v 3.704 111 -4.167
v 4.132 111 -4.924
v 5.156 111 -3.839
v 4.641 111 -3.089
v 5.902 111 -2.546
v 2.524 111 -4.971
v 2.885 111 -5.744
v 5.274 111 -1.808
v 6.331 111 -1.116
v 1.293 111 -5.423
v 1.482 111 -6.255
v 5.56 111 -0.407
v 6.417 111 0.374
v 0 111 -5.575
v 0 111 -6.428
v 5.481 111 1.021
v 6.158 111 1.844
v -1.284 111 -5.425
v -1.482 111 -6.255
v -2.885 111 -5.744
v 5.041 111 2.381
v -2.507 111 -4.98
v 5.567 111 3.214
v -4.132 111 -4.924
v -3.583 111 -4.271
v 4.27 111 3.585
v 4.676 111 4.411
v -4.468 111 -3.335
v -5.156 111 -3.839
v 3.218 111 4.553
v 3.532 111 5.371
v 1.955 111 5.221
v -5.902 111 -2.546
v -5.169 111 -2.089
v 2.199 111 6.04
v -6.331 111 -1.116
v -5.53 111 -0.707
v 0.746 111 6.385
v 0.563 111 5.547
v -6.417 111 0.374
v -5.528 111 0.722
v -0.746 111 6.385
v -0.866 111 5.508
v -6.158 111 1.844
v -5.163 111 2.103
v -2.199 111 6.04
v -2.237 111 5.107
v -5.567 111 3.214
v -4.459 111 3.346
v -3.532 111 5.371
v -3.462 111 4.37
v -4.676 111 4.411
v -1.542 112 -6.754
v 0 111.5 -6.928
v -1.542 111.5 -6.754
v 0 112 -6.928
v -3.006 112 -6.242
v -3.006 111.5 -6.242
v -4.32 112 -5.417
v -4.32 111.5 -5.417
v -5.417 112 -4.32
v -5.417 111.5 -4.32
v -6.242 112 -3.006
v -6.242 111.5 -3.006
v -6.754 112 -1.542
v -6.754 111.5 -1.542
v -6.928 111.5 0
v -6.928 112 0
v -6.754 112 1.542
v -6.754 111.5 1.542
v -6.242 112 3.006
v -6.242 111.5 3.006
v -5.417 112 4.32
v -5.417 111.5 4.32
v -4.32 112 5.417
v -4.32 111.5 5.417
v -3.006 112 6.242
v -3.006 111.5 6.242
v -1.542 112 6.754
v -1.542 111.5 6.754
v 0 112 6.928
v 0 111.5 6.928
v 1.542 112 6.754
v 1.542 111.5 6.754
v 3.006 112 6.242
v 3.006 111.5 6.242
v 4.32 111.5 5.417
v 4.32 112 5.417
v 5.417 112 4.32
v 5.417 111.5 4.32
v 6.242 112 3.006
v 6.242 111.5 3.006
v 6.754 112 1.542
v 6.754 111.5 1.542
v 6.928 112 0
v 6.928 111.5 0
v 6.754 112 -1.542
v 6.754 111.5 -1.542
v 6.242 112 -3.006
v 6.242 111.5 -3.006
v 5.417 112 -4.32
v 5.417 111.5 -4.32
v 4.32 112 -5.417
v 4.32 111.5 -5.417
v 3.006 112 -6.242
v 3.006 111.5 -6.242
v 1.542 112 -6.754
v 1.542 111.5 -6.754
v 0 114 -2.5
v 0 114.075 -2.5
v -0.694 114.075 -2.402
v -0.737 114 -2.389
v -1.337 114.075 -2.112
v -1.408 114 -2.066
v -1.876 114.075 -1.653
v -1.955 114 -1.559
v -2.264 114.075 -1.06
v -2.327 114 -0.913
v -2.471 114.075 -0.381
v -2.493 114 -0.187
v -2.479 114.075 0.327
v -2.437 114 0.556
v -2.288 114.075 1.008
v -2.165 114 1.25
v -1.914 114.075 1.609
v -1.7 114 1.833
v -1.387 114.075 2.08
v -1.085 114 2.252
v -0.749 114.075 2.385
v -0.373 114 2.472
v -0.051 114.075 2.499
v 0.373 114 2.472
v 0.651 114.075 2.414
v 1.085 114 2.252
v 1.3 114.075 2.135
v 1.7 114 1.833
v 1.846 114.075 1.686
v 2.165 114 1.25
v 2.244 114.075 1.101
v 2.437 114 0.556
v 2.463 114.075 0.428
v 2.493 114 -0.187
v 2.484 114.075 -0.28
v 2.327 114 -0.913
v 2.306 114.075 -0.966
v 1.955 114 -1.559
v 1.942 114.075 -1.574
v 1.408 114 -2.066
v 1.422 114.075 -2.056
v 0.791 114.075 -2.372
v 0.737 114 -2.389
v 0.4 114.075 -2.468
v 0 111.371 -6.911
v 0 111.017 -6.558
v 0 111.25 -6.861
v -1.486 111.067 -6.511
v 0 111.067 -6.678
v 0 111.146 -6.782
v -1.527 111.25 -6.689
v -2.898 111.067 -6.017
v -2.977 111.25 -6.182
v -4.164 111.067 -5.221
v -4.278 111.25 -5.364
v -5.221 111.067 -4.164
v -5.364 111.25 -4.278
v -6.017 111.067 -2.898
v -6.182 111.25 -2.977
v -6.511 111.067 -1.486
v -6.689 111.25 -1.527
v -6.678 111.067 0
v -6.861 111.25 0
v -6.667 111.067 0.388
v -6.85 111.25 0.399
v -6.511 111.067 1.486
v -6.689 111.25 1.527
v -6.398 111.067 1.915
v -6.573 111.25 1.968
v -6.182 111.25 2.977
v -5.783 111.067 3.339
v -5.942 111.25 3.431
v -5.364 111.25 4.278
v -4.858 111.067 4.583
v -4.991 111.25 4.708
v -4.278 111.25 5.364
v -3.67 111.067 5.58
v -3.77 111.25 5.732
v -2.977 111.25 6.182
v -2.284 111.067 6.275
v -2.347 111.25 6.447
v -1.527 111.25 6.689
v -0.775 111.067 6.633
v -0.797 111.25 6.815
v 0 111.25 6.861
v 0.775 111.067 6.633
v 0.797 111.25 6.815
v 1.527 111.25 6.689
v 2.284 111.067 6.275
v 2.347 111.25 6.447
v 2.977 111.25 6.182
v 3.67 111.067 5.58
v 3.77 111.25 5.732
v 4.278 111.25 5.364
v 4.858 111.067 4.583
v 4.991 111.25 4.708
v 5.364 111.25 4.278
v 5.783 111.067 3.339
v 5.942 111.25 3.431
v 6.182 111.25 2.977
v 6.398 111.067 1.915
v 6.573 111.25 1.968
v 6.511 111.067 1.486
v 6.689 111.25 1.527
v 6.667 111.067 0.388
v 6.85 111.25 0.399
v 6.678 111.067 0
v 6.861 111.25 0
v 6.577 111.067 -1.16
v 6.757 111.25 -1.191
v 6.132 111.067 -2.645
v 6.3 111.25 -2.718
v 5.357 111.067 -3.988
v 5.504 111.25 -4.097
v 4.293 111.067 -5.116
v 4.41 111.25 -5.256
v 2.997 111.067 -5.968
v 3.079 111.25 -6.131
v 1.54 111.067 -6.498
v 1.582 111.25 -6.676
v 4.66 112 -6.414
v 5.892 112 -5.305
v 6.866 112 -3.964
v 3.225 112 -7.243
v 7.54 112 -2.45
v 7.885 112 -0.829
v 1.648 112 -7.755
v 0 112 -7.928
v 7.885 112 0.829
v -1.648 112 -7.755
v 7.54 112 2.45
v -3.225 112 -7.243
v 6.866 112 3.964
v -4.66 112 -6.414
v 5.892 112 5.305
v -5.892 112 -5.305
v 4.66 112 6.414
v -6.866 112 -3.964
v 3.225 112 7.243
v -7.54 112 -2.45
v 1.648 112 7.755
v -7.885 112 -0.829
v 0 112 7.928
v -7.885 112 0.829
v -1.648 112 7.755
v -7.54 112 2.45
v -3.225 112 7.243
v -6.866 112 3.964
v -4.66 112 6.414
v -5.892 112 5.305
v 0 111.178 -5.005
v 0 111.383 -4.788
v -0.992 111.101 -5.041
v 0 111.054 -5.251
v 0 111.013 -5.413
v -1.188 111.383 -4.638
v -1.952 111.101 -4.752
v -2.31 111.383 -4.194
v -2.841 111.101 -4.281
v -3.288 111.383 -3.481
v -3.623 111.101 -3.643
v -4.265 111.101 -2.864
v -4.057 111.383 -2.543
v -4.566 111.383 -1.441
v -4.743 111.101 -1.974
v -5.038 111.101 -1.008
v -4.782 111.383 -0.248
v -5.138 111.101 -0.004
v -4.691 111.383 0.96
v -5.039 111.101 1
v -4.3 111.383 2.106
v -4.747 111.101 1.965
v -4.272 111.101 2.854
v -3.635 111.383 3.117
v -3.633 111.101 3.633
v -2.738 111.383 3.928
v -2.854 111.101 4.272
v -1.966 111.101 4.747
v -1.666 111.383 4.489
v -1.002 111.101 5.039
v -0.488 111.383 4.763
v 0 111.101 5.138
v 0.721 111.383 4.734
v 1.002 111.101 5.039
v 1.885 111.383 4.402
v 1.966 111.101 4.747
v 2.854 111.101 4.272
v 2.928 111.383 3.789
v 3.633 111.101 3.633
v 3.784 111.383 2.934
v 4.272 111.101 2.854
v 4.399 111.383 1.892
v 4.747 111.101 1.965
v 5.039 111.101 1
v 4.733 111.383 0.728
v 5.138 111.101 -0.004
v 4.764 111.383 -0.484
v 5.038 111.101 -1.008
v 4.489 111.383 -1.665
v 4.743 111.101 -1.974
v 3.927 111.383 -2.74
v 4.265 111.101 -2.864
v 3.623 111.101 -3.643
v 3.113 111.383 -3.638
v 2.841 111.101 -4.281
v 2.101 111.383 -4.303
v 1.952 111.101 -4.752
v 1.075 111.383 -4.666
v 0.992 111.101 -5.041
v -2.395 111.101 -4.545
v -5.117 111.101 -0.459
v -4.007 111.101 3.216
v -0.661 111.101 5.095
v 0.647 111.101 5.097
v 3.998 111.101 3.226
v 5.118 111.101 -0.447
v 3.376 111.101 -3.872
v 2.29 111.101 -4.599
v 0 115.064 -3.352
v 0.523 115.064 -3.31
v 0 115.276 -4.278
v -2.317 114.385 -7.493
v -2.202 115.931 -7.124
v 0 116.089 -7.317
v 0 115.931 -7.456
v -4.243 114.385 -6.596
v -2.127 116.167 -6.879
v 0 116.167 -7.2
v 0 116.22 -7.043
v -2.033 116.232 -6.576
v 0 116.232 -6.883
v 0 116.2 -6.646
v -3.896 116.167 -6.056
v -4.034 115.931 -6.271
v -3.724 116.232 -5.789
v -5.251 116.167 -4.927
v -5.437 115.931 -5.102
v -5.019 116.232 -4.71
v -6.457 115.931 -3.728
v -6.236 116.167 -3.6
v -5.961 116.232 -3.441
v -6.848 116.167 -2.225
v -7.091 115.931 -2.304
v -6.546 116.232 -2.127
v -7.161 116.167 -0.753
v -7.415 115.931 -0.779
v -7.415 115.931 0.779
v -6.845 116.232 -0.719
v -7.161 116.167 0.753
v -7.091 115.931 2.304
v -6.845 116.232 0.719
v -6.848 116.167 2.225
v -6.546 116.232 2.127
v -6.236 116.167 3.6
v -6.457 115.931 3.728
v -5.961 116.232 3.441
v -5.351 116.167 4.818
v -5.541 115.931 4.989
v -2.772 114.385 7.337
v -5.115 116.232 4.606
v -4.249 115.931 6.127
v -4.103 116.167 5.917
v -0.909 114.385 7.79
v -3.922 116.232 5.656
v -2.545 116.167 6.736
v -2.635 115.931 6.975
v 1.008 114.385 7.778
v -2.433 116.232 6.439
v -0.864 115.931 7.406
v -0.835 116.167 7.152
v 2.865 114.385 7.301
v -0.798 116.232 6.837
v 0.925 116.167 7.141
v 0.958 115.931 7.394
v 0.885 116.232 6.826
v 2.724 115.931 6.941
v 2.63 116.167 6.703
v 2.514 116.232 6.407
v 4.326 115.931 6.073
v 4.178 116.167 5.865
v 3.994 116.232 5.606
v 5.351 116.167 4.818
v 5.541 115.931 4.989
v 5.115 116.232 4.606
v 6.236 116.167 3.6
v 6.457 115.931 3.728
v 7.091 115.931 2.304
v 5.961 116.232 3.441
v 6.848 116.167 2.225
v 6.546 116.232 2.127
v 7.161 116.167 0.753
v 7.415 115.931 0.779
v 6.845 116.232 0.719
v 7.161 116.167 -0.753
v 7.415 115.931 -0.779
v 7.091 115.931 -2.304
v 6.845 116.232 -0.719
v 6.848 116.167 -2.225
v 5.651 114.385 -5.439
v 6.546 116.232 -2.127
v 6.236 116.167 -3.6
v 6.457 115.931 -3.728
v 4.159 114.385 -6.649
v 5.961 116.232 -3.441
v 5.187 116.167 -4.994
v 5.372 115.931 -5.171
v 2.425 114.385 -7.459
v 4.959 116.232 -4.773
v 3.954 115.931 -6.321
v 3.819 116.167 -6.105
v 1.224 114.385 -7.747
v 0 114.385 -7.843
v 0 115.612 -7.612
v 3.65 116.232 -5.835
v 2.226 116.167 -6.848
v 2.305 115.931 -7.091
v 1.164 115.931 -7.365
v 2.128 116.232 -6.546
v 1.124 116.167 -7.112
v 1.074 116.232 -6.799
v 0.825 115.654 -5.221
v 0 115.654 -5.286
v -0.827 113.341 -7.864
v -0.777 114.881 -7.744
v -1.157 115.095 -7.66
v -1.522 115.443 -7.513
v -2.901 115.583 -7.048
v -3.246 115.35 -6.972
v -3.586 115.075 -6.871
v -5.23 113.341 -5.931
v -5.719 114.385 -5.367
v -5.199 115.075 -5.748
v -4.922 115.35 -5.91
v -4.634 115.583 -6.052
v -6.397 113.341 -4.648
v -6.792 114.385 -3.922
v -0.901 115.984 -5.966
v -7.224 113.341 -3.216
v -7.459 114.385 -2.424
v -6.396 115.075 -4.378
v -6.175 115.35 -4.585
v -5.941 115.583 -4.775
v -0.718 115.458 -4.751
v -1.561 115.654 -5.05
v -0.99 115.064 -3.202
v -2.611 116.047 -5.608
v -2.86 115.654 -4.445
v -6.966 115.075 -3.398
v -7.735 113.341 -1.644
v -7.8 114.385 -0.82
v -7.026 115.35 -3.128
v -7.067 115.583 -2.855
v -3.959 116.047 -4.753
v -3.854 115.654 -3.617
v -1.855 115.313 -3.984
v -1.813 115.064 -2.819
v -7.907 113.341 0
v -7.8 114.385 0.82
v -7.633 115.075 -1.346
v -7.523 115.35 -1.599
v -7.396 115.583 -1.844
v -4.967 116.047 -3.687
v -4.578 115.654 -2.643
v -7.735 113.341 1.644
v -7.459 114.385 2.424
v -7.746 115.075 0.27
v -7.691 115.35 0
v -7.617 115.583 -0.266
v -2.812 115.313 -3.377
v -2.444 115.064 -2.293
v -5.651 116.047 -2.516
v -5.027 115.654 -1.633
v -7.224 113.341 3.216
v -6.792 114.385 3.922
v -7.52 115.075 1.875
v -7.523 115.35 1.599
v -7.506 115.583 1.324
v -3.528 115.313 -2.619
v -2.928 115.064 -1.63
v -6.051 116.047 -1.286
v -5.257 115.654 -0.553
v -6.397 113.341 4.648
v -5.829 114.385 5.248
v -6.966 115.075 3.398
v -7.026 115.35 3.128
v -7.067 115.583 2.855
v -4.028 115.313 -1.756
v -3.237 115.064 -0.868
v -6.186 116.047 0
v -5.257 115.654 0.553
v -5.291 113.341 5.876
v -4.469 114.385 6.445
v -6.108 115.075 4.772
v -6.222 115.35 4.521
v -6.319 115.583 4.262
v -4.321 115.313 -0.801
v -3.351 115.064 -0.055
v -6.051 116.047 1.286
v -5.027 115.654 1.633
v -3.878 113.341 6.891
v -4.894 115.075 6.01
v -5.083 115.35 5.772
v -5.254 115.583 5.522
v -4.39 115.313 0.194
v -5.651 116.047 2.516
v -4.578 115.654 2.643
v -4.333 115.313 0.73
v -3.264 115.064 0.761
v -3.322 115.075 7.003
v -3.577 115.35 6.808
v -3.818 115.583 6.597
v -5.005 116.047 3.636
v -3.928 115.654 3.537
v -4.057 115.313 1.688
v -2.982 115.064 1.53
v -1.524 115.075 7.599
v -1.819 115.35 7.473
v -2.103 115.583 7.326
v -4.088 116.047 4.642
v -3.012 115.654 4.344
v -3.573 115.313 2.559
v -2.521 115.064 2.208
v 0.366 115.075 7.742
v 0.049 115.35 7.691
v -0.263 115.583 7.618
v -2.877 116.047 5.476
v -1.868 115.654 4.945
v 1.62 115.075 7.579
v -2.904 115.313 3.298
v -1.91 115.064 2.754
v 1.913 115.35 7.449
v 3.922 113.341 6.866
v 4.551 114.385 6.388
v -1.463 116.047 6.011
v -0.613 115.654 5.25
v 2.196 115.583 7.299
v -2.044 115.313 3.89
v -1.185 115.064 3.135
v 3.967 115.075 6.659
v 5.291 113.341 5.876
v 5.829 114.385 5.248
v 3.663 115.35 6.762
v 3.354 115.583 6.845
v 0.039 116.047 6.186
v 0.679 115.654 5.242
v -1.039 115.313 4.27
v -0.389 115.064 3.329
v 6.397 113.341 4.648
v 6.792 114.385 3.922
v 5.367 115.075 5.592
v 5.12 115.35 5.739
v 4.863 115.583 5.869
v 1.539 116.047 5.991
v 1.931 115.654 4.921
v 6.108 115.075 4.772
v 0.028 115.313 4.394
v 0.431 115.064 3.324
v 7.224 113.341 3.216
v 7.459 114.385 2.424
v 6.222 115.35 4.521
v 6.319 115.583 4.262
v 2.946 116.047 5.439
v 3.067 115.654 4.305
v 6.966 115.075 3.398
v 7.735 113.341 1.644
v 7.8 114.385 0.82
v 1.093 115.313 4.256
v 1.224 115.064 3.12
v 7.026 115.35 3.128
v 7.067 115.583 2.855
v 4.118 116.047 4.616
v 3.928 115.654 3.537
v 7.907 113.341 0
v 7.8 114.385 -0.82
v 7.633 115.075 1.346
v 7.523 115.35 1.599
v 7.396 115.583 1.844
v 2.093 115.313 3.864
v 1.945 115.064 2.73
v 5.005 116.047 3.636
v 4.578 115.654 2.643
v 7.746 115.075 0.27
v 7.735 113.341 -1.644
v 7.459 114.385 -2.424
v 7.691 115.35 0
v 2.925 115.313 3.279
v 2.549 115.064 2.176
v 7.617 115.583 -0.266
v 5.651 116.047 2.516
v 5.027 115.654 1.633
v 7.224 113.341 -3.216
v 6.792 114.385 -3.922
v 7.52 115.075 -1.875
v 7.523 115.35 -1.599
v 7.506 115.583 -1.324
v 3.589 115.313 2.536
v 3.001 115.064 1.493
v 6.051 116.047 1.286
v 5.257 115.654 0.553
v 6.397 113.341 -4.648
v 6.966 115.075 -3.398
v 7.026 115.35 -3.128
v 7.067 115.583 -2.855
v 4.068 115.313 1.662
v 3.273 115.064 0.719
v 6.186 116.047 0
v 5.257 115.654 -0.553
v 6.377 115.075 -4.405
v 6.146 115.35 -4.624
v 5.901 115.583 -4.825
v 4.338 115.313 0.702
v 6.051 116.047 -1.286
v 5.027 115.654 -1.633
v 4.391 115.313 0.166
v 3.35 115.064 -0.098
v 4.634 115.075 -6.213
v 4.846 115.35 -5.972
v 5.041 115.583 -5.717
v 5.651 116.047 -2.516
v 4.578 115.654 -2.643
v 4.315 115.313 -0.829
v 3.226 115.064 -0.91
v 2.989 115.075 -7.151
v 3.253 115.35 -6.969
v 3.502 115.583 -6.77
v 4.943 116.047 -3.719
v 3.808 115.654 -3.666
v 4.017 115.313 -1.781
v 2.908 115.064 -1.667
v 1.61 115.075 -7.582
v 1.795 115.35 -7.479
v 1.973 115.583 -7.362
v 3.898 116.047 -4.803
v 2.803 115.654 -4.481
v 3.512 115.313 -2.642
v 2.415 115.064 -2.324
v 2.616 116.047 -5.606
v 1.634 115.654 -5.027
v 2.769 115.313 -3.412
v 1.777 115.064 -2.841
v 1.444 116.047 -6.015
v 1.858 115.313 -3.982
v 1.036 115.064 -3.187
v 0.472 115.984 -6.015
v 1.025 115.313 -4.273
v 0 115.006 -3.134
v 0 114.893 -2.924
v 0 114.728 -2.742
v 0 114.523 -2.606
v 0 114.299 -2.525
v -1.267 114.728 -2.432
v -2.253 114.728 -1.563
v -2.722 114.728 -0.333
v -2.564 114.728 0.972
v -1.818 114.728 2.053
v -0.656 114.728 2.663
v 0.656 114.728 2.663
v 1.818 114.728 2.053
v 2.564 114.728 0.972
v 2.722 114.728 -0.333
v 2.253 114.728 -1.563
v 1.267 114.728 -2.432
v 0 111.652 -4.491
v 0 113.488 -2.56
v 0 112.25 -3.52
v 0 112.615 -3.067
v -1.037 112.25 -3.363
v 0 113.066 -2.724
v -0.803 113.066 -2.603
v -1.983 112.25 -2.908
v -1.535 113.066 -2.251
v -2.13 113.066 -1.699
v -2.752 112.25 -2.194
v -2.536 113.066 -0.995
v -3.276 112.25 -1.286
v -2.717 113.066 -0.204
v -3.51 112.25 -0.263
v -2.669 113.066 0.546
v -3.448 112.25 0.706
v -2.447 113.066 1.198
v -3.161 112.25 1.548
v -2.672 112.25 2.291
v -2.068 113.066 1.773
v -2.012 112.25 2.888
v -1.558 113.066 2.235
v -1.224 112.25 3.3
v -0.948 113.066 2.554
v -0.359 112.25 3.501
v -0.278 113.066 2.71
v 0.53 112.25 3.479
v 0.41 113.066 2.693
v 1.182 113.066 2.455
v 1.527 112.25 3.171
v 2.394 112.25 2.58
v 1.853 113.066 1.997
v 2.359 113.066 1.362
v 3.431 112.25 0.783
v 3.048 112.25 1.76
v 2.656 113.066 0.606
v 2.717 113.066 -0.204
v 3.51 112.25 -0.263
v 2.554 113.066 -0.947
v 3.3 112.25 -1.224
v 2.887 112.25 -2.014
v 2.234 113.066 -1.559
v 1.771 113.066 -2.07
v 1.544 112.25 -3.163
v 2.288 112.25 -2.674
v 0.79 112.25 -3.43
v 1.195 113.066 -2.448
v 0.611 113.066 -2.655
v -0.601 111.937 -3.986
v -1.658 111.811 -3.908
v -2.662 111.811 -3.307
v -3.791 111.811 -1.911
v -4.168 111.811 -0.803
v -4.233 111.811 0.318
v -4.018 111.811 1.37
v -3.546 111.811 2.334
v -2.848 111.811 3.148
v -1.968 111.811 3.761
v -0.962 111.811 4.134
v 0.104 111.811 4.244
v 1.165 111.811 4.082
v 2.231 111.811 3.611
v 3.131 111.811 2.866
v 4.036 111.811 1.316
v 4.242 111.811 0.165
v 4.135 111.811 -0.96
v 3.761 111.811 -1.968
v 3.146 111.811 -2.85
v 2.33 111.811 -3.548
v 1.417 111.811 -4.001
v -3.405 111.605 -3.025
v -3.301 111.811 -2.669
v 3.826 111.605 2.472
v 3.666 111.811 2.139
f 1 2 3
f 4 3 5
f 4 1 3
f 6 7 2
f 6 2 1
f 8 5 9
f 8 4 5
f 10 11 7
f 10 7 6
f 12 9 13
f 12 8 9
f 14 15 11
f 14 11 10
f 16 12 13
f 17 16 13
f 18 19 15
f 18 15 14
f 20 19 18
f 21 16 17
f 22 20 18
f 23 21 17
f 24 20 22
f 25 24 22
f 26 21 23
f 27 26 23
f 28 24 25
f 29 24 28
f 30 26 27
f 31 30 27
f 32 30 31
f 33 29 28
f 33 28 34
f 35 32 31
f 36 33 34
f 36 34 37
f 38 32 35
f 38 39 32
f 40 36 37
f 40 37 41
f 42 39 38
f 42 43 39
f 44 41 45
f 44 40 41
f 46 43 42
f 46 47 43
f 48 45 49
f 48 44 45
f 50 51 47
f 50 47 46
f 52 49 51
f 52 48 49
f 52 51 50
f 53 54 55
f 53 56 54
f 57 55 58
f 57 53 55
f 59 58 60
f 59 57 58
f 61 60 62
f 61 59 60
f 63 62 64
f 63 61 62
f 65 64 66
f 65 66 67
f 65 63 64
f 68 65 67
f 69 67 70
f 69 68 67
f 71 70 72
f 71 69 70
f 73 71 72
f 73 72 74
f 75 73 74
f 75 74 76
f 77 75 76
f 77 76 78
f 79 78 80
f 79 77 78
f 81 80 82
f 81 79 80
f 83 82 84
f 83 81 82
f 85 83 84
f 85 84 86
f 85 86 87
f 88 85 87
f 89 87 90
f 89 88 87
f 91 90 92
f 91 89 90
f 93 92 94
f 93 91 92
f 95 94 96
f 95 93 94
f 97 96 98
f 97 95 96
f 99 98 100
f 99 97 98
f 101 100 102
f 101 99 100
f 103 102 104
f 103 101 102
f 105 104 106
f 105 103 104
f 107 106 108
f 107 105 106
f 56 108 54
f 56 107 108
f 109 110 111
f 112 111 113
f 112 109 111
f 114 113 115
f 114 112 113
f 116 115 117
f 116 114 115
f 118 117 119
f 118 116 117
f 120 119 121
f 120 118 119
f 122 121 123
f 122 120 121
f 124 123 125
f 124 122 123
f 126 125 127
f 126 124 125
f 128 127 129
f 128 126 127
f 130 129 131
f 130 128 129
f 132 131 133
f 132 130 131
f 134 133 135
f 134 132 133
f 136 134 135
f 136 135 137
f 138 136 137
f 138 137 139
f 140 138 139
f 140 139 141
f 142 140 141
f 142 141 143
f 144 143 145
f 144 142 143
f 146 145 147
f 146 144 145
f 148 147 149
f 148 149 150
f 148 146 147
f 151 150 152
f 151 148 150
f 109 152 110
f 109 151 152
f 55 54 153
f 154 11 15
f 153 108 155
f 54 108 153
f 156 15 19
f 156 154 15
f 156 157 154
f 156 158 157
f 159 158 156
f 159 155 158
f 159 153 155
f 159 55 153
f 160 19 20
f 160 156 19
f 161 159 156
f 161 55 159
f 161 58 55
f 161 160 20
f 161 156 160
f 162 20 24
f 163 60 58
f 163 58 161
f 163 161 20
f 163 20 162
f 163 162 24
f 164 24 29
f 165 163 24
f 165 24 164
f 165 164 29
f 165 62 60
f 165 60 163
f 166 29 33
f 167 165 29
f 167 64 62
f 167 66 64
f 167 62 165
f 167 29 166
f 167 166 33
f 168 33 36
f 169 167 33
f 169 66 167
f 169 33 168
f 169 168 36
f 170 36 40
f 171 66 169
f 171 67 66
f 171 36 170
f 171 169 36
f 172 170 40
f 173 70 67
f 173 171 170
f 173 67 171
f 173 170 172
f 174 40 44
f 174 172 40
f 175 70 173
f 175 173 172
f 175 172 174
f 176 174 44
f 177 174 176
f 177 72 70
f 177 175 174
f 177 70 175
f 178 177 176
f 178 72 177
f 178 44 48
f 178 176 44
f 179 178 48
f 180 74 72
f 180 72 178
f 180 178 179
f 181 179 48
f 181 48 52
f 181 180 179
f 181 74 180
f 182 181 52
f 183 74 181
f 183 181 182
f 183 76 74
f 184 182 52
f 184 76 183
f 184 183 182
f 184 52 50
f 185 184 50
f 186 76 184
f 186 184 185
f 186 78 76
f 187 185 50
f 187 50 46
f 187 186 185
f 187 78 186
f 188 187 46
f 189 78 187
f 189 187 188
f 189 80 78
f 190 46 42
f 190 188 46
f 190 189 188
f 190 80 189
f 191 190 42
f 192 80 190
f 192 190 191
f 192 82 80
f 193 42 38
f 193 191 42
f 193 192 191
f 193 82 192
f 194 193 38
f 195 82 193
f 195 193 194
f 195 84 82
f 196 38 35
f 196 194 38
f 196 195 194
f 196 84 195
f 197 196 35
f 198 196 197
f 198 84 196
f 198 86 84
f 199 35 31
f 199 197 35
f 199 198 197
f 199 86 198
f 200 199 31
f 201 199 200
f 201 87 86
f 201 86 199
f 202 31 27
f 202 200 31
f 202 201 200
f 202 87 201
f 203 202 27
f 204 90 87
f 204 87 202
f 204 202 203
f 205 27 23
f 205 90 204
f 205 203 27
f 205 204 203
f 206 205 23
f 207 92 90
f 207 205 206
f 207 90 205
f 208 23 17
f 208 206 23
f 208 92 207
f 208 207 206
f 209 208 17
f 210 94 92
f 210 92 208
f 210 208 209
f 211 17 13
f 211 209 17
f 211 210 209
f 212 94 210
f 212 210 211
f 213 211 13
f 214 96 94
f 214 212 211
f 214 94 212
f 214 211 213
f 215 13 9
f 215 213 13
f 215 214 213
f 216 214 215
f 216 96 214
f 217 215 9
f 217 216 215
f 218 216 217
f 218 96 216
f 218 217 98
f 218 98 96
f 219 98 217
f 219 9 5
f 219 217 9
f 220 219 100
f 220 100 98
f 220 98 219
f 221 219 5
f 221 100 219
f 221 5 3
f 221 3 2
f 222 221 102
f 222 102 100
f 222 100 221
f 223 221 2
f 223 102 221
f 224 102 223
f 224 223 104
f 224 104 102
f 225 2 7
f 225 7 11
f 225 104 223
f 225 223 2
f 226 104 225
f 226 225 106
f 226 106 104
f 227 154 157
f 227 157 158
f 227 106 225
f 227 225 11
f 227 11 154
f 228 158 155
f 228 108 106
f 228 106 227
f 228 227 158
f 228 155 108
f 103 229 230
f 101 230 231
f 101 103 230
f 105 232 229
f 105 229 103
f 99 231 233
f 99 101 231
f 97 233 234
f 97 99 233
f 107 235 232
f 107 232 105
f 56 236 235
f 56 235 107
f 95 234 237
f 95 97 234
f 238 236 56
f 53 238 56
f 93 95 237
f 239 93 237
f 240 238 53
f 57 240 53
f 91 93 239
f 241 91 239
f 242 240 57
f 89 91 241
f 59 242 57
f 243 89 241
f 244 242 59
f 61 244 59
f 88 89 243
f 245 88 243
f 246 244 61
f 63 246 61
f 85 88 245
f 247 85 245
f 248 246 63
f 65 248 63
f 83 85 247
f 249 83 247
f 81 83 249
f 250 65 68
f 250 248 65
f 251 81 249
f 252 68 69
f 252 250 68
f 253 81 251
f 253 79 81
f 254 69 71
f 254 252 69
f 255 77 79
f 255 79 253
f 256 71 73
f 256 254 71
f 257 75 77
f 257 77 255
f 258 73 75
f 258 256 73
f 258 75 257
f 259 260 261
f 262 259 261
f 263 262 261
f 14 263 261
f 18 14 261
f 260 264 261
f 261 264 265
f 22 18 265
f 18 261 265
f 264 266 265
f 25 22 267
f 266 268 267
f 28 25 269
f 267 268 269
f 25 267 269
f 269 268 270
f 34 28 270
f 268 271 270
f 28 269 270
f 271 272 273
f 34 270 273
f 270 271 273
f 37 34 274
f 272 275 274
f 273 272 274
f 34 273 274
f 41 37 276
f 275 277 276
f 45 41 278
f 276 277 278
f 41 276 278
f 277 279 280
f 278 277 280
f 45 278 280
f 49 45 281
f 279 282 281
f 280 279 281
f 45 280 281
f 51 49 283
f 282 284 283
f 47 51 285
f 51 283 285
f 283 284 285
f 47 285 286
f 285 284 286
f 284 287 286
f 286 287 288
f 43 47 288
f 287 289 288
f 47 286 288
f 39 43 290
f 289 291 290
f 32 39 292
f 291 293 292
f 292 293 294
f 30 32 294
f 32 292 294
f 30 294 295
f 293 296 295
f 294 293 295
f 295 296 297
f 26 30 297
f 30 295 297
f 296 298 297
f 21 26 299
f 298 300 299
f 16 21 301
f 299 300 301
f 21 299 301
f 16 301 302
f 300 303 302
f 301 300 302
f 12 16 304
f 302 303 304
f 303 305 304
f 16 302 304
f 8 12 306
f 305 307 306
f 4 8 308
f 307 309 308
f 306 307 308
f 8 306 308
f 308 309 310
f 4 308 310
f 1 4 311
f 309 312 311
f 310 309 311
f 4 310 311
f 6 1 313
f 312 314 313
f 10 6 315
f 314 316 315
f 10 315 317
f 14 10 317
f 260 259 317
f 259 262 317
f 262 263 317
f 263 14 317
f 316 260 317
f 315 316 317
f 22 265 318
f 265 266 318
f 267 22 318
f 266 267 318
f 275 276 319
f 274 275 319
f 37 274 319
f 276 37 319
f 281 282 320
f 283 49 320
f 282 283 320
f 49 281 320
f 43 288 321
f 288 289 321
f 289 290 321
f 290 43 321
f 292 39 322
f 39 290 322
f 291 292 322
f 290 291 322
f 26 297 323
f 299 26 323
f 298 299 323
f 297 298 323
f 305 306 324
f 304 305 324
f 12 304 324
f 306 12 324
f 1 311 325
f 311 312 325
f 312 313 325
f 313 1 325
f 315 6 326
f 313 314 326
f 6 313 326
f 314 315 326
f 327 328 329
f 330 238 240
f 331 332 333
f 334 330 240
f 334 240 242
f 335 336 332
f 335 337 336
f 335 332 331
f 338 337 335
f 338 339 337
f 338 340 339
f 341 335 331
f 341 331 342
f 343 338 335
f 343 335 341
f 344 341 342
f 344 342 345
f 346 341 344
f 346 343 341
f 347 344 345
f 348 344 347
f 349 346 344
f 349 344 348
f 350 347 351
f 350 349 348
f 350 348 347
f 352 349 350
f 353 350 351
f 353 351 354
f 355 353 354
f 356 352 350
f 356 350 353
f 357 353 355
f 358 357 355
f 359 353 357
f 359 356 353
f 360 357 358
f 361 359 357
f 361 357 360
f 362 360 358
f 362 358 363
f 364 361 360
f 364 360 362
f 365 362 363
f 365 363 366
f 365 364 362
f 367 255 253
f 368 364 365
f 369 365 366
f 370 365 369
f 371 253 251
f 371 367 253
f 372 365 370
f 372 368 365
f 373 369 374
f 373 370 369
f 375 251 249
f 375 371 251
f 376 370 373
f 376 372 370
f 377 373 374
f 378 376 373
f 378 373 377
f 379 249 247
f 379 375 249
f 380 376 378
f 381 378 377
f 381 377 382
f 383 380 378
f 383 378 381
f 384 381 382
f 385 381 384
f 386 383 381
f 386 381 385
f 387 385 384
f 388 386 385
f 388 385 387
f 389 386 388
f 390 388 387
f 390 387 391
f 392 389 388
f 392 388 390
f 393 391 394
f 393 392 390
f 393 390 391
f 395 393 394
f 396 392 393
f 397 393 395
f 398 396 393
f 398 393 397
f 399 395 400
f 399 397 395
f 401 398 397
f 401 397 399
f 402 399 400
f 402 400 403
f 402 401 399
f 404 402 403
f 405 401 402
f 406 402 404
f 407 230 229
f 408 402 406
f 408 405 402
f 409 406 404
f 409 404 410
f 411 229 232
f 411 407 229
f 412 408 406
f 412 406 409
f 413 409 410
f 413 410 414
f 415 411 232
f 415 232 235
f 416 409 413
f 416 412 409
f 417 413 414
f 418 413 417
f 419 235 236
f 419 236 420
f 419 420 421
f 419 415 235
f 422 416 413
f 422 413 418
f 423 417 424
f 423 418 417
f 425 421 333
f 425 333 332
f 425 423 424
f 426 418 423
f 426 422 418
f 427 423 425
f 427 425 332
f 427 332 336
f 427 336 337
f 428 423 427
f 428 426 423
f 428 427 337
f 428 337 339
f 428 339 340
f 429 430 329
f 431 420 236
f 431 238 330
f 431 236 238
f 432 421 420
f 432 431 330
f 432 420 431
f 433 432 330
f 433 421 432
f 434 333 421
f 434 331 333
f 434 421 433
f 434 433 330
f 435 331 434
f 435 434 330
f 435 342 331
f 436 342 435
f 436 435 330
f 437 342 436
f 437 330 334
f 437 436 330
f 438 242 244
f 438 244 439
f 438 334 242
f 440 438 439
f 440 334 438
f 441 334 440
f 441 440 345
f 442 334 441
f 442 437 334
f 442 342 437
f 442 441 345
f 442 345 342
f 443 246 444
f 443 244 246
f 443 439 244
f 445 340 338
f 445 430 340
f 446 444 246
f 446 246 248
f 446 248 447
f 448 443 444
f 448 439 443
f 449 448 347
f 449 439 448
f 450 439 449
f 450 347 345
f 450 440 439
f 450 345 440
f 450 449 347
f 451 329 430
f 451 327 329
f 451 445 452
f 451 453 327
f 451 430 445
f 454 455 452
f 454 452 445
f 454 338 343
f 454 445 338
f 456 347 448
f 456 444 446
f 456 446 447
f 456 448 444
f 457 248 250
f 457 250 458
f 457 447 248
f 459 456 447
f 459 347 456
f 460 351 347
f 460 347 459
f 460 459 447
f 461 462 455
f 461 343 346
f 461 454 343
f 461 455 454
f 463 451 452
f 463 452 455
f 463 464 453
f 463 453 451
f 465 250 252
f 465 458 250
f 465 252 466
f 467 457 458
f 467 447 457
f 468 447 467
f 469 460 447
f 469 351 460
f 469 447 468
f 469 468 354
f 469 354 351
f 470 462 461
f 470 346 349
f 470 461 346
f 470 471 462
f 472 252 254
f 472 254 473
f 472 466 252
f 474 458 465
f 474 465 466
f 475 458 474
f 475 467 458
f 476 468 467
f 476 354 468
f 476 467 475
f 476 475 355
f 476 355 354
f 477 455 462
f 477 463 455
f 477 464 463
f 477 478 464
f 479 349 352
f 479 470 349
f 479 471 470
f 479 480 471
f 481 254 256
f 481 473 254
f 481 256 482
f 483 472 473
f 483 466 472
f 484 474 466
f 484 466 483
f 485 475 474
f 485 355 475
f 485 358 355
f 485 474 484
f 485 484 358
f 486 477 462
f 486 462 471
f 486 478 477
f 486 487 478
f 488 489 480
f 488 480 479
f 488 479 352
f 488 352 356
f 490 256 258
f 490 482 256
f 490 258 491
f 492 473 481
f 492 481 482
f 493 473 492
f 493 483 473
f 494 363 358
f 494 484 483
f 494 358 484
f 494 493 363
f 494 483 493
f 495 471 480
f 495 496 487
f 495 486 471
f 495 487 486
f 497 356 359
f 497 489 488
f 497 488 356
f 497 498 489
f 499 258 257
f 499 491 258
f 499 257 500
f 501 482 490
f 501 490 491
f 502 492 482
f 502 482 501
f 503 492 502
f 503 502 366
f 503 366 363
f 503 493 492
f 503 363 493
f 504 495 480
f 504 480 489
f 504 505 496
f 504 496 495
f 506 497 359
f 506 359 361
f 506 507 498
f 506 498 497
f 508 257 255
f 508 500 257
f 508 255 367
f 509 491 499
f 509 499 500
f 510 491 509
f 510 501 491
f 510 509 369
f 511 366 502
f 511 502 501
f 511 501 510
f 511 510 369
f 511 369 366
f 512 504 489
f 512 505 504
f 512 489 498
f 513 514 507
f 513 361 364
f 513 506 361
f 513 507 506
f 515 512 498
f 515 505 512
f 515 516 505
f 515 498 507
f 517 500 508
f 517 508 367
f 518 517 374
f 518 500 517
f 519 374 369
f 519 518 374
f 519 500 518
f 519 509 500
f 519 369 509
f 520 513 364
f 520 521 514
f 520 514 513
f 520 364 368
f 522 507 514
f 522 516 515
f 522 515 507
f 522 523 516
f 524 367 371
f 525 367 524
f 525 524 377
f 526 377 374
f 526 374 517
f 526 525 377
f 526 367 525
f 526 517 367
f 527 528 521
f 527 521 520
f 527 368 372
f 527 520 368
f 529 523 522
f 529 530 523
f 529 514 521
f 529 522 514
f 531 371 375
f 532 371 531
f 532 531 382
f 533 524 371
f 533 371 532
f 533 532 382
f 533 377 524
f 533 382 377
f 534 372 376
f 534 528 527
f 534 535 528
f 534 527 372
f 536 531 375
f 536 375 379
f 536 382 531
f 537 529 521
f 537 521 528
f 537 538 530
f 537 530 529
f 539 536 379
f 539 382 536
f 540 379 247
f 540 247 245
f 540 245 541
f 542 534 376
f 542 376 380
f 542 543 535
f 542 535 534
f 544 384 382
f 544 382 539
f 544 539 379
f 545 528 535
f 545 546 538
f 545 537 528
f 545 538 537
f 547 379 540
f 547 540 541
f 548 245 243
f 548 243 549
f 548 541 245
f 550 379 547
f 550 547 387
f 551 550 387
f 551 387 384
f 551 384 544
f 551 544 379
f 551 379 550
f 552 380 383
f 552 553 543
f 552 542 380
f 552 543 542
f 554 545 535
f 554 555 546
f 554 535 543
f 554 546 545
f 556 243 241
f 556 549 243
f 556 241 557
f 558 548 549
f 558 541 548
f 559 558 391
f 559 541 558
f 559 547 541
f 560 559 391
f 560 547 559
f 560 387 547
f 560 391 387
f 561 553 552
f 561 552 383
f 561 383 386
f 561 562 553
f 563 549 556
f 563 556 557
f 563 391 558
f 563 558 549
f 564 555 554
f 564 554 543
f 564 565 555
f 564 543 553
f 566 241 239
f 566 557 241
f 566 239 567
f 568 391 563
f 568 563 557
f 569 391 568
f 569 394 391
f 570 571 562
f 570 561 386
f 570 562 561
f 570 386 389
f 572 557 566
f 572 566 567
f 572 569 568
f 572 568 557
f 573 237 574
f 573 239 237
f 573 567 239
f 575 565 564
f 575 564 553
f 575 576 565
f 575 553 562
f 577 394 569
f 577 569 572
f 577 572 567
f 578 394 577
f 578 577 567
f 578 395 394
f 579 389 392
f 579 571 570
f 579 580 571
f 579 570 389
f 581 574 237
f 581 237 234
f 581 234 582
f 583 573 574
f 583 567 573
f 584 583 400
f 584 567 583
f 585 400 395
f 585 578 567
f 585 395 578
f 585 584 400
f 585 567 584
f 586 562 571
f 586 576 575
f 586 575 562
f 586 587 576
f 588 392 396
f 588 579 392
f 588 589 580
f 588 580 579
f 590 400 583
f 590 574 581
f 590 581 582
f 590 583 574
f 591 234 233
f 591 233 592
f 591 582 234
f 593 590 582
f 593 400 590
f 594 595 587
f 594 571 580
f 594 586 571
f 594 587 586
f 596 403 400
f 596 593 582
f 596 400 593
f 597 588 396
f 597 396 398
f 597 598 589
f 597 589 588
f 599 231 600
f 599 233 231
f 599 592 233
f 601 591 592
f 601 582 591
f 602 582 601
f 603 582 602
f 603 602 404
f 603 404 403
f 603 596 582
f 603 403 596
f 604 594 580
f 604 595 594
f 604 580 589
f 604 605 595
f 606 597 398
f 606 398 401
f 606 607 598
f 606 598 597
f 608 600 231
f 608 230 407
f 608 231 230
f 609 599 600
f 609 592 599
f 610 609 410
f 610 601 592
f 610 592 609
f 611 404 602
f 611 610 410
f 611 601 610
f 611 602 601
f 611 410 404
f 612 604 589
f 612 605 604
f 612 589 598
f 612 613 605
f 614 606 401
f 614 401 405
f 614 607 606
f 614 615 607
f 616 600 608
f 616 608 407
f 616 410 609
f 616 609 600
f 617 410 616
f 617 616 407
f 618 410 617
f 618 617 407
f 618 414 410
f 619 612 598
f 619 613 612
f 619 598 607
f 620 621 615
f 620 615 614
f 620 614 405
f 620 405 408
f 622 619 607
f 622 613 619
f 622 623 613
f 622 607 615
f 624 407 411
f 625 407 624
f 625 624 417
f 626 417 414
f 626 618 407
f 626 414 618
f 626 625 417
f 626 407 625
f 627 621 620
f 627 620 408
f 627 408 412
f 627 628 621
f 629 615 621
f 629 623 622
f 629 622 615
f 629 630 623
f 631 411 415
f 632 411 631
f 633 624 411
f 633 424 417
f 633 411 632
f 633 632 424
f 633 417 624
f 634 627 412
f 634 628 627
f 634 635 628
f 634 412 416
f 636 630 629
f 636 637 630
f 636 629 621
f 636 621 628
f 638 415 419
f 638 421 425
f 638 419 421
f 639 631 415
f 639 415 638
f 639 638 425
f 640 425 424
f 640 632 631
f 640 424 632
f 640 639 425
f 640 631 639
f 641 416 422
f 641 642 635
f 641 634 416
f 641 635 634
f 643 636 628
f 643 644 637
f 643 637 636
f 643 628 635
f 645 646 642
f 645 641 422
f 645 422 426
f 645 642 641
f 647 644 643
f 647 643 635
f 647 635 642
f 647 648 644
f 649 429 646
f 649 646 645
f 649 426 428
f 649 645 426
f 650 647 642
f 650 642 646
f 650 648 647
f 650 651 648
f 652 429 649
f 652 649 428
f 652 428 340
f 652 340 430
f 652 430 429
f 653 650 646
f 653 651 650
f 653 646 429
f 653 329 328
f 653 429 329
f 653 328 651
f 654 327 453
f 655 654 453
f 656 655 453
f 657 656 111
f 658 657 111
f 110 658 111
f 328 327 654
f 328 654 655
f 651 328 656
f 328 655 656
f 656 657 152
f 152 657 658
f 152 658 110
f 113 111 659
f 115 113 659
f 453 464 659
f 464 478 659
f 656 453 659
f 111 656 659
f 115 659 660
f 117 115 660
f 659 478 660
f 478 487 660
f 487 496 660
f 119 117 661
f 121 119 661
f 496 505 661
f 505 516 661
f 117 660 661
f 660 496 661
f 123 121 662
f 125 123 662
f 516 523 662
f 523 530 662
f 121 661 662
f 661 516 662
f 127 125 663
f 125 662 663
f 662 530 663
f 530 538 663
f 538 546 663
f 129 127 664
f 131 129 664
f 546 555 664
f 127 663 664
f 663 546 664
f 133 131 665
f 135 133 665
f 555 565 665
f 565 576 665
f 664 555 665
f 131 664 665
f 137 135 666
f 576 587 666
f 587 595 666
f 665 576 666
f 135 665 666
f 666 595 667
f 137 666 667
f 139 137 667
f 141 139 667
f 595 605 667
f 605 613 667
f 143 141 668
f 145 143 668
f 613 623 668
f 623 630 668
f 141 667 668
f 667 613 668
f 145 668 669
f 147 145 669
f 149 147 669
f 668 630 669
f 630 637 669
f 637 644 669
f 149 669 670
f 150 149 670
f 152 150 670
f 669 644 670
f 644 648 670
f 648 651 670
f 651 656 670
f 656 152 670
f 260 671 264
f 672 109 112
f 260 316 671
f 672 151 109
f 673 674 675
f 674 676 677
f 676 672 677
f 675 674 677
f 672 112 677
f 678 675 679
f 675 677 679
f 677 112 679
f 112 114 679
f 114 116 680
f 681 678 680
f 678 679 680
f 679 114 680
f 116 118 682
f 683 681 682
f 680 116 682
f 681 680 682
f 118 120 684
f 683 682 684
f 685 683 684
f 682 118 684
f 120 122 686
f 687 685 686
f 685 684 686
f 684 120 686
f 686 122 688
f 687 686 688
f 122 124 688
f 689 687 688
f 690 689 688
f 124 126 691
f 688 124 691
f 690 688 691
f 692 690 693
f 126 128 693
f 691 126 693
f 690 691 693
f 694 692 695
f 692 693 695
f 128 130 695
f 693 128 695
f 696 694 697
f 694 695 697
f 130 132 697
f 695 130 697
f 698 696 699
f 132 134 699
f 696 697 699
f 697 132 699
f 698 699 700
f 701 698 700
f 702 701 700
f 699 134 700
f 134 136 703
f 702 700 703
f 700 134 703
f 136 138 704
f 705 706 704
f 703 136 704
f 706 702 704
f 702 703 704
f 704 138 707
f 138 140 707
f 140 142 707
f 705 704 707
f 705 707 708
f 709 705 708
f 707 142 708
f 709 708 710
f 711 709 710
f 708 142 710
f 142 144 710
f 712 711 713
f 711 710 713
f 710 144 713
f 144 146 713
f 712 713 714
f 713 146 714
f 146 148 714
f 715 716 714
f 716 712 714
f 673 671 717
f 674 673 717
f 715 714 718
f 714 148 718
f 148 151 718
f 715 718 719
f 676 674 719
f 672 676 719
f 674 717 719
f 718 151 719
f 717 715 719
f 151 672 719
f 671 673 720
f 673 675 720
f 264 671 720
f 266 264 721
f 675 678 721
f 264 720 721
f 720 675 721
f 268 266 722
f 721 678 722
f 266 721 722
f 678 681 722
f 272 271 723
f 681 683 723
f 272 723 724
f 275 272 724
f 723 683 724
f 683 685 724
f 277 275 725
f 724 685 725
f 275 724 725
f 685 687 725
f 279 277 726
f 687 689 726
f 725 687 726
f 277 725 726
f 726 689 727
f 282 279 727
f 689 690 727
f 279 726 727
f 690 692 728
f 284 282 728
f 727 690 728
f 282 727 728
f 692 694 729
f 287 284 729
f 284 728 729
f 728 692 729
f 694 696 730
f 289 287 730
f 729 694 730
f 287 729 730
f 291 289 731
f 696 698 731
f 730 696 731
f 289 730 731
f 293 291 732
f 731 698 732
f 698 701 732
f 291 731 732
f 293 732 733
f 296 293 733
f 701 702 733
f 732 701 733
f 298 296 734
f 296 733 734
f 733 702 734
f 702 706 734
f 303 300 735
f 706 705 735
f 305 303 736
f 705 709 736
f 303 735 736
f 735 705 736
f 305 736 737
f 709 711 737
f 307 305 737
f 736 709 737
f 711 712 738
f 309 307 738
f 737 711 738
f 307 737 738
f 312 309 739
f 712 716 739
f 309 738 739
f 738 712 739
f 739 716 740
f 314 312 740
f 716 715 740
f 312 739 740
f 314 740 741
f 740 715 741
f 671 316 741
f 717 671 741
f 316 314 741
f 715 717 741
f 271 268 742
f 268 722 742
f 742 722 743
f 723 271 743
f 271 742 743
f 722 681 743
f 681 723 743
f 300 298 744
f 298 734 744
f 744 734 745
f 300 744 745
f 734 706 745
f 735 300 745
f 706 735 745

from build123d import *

# Parameters (mm, degrees)
FILLET_1_R = 1


with BuildPart() as part:
    # 草图1 → 旋转1 (revolve)
    with BuildSketch(Plane(origin=(0, 0, 0), x_dir=(0, 0, -1), z_dir=(1, 0, 0)), mode=Mode.PRIVATE) as revolve_1_sk:
        with BuildLine():
            Line((-6.928164391, 112), (-7.928164391, 112))
            add(Edge.make_bspline(
                [(-7.928164391, 112), (-7.928164391, 119.236034272), (-6.5, 115), (-2.5, 115)],
                knots=[0, 0, 0, 0, 1, 1, 1, 1], degree=3))
            Line((-2.5, 115), (-2.5, 114))
            add(Edge.make_bspline(
                [(-4.928164391, 111), (-4.928164391, 112.00000018), (-2.5, 112.00000018), (-2.5, 114)],
                knots=[0, 0, 0, 0, 1, 1, 1, 1], degree=3))
            Line((-4.928164391, 111), (-6.428164391, 111))
            ThreePointArc((-6.428164391, 111), (-6.781717782, 111.146446609), (-6.928164391, 111.5))
            Line((-6.928164391, 111.5), (-6.928164391, 112))
        make_face()
    revolve(revolve_1_sk.sketch.rotate(Axis((0, 103.198398654, 0), (0, 1, 0)), 180), axis=Axis((0, 103.198398654, 0), (0, 1, 0)))

    # 圆角1
    fillet_1_edges = [part.edges().sort_by_distance(p)[0] for p in [
        (0, 115, 2.5),
        (0, 111, 4.928164391),
    ]]
    fillet(fillet_1_edges, radius=FILLET_1_R)


solid = part.part
